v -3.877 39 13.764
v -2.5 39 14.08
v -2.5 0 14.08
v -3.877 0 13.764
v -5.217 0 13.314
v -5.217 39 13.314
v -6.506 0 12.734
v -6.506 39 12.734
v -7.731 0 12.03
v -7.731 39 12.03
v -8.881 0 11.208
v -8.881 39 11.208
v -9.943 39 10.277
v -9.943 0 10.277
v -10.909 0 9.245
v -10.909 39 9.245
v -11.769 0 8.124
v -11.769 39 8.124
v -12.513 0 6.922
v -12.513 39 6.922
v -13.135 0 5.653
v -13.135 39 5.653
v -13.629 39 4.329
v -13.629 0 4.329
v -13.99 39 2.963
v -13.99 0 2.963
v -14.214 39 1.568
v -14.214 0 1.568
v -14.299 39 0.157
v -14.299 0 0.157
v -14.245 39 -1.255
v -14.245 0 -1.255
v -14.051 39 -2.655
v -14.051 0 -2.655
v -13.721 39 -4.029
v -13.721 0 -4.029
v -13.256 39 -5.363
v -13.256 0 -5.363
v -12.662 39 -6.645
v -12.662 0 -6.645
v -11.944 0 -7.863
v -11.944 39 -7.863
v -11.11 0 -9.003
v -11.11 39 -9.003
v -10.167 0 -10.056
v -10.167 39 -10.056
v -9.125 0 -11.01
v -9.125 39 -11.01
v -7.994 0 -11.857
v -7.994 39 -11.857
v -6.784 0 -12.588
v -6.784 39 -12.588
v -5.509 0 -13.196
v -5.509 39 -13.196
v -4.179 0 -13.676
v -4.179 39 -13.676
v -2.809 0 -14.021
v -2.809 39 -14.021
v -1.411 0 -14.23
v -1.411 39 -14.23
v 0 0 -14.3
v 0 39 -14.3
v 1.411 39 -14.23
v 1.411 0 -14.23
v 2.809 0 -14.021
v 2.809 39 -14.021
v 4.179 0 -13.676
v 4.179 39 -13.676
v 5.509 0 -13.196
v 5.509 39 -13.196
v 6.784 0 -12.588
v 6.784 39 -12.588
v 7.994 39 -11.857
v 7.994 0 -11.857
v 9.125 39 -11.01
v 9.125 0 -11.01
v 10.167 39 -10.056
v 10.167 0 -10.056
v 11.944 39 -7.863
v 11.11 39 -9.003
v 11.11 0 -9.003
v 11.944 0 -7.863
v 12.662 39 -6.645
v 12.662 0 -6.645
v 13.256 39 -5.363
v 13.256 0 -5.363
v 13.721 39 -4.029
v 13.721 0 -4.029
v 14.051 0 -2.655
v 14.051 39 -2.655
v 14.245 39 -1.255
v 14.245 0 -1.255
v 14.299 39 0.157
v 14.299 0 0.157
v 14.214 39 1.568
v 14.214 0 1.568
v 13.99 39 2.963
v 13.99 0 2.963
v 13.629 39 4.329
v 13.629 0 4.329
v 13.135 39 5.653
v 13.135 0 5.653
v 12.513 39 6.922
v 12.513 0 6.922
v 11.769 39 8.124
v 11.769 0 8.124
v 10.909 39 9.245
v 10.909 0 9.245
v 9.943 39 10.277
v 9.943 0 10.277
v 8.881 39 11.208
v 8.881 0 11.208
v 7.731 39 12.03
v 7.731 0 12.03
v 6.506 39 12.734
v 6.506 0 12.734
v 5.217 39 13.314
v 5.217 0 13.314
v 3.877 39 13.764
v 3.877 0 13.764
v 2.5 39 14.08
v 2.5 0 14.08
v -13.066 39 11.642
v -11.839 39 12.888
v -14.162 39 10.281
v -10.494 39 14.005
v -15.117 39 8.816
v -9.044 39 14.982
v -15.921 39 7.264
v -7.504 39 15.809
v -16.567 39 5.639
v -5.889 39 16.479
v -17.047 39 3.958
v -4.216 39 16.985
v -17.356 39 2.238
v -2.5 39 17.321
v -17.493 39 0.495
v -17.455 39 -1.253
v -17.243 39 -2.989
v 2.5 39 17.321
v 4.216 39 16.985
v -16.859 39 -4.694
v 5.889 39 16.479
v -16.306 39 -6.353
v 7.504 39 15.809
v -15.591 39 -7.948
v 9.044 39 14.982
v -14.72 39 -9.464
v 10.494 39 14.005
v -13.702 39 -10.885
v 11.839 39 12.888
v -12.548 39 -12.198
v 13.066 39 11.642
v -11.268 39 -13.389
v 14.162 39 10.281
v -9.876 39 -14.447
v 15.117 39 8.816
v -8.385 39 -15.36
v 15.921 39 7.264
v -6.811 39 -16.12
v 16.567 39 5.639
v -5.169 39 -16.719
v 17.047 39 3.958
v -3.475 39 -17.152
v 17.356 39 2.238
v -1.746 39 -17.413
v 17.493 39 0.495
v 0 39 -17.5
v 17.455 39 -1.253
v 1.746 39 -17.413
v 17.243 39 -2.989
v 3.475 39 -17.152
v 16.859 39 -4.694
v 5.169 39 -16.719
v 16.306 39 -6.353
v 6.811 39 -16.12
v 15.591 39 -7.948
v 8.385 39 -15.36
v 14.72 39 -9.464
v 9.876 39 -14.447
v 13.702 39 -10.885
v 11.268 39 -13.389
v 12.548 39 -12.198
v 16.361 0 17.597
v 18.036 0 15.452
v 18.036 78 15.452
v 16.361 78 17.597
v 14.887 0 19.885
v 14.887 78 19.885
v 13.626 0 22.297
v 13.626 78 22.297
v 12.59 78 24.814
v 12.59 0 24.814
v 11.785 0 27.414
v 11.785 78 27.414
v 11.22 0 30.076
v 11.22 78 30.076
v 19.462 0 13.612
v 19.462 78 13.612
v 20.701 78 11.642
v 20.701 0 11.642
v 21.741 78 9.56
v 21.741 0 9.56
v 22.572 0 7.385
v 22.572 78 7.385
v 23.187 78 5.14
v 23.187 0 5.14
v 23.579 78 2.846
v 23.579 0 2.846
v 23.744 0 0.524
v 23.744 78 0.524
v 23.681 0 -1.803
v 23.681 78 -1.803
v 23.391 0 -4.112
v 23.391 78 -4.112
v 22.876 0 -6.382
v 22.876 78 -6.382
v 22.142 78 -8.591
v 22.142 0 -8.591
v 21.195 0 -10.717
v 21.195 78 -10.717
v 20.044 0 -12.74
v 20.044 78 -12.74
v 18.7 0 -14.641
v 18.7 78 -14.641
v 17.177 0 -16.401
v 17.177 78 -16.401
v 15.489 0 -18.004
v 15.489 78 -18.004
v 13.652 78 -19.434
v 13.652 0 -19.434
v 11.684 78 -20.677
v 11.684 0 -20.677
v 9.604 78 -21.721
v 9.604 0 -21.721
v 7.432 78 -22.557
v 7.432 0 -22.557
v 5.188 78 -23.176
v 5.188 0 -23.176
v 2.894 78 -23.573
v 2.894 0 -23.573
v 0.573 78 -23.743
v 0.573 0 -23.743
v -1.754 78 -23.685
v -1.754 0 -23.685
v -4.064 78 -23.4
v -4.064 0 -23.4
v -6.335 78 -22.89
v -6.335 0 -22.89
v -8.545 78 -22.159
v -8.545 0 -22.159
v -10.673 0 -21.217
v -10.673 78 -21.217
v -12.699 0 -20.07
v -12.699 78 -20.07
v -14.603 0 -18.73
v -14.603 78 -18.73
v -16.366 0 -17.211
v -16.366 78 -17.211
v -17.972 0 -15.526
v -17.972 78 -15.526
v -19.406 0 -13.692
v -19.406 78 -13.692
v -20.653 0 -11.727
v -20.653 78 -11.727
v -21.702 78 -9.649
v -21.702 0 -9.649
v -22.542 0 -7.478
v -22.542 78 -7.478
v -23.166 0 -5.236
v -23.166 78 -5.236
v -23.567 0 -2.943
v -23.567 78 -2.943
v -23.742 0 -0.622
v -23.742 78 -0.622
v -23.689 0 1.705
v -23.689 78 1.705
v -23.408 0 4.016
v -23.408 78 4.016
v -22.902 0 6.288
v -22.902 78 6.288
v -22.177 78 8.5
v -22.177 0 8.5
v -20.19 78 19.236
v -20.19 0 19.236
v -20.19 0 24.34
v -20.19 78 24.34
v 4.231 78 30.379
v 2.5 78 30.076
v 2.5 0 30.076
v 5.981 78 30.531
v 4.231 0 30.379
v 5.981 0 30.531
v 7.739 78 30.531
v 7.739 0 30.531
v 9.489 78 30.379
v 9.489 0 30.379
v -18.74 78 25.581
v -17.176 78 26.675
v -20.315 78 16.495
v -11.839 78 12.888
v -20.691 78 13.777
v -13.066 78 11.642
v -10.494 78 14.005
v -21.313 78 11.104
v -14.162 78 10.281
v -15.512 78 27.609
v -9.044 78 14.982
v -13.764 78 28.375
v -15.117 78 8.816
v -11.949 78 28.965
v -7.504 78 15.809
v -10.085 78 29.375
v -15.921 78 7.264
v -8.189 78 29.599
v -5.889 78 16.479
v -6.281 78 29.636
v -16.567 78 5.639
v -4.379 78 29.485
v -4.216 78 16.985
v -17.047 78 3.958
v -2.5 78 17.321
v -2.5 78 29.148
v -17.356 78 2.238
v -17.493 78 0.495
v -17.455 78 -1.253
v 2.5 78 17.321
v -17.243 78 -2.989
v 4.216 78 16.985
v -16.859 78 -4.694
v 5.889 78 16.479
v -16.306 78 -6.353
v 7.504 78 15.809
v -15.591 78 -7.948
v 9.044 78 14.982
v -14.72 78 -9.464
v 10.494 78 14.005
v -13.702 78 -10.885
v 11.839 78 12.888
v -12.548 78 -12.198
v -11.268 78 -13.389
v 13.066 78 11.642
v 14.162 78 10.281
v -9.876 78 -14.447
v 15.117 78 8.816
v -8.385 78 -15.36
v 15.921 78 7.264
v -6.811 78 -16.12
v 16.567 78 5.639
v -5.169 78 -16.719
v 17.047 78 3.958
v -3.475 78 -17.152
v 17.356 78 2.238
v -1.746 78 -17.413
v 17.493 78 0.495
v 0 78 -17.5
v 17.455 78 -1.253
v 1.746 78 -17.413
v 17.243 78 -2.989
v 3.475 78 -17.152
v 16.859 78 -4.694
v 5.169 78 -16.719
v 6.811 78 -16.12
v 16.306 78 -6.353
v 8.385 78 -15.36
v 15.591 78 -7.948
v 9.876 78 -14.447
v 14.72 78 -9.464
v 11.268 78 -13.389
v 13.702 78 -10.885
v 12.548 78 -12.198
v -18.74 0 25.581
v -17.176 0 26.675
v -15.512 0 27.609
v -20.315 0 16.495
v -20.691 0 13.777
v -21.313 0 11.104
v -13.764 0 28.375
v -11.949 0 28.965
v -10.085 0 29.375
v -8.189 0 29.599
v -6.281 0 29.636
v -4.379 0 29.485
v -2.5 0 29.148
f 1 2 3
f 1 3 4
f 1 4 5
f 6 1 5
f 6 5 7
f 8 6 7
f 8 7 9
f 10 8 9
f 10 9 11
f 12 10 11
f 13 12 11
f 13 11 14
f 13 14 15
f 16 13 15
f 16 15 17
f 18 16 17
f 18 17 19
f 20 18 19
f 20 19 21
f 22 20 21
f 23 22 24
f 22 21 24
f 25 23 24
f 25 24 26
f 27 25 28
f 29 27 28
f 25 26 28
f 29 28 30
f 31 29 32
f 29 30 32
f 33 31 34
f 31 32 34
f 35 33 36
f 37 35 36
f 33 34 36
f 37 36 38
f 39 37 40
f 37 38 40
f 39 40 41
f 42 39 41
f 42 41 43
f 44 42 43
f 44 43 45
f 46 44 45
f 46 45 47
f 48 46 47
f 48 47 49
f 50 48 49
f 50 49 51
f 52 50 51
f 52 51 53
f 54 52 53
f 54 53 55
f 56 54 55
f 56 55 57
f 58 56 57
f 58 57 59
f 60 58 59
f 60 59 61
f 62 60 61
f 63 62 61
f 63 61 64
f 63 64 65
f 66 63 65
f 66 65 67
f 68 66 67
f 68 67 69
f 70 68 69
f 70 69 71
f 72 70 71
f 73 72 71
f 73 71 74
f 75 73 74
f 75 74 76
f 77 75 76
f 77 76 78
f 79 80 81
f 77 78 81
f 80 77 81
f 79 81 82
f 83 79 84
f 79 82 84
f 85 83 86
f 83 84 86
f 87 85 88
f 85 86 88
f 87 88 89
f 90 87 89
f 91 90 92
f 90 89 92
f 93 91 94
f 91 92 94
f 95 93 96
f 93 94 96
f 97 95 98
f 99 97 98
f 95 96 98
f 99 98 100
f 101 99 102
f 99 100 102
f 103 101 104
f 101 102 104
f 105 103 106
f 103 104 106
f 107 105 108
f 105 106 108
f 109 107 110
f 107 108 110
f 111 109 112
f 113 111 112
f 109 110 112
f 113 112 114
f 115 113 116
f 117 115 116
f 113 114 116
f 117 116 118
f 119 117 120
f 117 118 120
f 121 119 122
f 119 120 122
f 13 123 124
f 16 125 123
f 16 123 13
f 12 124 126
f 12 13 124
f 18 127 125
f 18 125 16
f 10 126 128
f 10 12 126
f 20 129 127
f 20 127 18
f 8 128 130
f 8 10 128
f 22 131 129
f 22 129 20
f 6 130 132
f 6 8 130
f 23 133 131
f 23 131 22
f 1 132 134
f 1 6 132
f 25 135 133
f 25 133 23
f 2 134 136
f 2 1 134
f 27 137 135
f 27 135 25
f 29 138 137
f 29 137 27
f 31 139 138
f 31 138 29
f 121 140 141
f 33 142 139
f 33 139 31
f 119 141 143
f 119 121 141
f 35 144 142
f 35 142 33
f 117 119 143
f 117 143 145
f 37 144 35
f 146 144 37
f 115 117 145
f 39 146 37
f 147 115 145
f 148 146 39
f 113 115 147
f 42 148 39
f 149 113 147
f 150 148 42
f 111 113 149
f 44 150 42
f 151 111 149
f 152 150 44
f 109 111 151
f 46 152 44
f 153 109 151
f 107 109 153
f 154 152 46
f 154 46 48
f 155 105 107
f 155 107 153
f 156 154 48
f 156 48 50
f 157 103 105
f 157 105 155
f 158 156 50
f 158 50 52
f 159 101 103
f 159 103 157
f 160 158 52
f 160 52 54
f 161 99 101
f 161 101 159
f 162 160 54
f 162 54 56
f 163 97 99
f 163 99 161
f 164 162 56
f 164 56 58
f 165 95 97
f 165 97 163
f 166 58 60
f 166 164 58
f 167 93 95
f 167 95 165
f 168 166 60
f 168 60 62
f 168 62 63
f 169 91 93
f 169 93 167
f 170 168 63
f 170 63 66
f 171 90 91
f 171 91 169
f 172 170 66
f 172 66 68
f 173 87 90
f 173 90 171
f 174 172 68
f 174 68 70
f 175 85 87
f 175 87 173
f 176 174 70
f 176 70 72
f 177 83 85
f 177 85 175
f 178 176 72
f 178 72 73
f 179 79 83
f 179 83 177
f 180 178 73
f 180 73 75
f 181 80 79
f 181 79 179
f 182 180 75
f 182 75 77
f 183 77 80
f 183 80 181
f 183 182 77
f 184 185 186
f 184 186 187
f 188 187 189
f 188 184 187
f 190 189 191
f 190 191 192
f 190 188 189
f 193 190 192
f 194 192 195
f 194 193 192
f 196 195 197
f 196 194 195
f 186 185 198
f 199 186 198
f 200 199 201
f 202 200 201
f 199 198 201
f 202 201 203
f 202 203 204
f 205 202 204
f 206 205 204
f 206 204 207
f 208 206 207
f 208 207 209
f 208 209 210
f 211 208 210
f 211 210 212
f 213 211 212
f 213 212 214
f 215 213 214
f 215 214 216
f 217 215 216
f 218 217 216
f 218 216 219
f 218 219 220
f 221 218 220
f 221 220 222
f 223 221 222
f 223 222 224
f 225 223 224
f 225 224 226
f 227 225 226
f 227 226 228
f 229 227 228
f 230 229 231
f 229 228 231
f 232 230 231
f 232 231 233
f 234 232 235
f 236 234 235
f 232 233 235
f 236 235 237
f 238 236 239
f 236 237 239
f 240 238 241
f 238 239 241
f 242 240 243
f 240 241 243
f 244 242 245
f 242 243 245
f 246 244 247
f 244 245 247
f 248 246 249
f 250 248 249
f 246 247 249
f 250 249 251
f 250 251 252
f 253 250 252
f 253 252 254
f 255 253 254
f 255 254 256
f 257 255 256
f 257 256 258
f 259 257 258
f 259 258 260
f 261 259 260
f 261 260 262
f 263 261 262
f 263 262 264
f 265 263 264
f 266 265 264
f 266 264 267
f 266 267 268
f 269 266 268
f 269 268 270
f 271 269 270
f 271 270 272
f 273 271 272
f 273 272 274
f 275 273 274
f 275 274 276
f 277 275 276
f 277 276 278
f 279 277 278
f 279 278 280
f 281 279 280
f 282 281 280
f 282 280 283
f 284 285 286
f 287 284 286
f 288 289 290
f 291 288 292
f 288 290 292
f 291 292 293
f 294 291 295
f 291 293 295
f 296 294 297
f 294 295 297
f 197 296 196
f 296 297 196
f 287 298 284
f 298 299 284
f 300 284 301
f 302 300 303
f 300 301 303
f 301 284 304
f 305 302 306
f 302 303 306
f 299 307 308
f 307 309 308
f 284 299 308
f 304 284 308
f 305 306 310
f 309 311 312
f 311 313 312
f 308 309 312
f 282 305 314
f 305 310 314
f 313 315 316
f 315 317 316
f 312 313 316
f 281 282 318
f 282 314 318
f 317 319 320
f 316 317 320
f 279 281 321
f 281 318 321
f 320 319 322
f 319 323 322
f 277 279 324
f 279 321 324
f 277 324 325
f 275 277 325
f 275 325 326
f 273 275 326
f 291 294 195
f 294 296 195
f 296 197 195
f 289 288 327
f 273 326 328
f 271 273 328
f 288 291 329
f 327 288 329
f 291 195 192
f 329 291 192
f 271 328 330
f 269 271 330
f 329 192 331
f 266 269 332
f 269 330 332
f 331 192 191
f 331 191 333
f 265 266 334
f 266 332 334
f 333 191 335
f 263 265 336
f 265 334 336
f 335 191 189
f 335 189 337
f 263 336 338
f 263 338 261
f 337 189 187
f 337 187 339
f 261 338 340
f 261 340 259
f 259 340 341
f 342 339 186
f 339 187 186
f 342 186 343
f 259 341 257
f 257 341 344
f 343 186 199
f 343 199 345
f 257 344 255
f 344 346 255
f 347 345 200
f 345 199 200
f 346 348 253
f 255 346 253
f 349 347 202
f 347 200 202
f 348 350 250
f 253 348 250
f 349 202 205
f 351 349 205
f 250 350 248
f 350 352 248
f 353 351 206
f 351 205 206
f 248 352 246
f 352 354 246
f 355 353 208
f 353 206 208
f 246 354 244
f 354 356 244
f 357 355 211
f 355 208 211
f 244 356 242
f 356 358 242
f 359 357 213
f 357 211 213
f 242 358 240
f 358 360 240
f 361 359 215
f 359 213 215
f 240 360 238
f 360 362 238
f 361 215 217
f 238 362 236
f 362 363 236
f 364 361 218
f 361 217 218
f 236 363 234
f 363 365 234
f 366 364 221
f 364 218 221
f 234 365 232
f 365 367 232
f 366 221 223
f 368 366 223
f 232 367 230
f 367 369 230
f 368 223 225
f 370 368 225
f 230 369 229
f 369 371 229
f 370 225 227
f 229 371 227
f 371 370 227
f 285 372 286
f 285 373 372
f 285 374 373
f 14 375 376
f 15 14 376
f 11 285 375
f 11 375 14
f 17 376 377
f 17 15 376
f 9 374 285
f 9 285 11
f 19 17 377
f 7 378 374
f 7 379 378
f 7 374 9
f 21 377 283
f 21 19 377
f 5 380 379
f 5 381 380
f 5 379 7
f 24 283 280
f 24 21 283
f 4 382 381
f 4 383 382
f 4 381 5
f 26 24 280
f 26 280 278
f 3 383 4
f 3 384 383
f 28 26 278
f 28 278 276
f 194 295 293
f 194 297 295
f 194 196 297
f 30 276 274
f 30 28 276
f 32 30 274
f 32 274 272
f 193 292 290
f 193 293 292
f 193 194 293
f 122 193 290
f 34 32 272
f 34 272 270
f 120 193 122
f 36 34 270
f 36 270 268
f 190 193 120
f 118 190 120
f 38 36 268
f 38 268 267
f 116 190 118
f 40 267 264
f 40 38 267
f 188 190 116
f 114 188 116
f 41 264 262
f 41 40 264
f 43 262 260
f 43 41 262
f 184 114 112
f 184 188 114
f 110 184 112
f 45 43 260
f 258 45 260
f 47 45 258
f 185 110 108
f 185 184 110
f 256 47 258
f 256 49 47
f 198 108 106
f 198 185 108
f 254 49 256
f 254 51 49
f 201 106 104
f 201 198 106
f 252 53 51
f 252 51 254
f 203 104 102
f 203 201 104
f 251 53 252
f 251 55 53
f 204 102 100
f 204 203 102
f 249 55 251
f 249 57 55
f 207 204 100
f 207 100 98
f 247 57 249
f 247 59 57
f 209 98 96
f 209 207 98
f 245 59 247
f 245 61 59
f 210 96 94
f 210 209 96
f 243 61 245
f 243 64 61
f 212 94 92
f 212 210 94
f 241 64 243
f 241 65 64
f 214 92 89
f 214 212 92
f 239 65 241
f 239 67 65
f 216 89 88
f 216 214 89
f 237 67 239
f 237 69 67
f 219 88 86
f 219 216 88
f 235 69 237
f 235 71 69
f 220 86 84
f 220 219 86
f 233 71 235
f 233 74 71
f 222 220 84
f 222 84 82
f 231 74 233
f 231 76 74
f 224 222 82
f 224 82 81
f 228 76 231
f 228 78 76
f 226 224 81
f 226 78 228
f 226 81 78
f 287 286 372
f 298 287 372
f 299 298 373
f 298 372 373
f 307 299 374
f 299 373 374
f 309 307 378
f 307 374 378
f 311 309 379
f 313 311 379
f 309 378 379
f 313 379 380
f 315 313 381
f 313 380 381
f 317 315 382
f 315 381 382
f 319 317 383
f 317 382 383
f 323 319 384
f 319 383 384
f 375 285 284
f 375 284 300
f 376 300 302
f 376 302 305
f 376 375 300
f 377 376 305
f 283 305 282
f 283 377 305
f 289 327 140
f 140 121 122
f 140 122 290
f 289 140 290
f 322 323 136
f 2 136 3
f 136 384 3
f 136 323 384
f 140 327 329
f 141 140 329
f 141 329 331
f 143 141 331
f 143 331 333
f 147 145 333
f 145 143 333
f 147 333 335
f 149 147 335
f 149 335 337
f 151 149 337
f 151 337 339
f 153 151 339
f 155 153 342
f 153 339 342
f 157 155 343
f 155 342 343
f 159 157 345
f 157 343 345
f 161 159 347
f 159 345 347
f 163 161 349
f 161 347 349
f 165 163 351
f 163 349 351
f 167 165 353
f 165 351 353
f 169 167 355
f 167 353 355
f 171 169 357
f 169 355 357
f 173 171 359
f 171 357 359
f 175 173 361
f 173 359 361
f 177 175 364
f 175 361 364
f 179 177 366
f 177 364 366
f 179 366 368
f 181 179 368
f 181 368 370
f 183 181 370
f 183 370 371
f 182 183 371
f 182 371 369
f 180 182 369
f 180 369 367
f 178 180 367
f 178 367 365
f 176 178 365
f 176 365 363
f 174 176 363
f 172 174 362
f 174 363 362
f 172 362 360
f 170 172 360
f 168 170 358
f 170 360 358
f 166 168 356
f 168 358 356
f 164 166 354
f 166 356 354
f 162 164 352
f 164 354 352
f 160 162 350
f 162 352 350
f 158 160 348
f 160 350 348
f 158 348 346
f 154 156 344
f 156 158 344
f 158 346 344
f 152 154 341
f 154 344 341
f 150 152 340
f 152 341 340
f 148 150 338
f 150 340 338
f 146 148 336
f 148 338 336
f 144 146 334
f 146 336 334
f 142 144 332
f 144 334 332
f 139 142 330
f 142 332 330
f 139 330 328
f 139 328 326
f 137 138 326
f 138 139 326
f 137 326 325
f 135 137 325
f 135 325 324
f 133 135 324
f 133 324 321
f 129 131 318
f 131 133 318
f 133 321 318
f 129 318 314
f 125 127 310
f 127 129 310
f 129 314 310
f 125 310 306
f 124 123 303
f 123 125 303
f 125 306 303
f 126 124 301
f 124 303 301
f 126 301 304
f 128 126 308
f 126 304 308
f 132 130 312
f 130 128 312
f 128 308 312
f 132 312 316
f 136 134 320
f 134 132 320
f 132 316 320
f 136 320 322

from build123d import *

# Parameters (mm, degrees)
BOSS_EXTRUDE1_DEPTH = 78
SKETCH2_R           = 17.5
CUT_EXTRUDE1_DEPTH  = 39
FILLET1_R           = 30


with BuildPart() as part:
    # Sketch1 → Boss-Extrude1 (new body)
    with BuildSketch(Plane(origin=(0, 0, 0), x_dir=(1, 0, 0), z_dir=(0, 1, 0))):
        with BuildLine():
            Line((2.5, -14.079772725), (2.5, -21.006468516))
            Line((2.5, -21.006468516), (2.5, -30.076468516))
            ThreePointArc((2.5, -30.076468516), (6.86, -30.550052571), (11.22, -30.076468516))
            Line((11.22, -30.076468516), (11.22, -20.932608533))
            ThreePointArc((11.22, -20.932608533), (6.153268827, 22.93904494), (-20.19, -12.50705401))
            Line((-20.19, -12.50705401), (-20.19, -24.339979577))
            ThreePointArc((-20.19, -24.339979577), (-11.948714524, -28.965226171), (-2.5, -29.148218549))
            Line((-2.5, -29.148218549), (-2.5, -21.006468516))
            Line((-2.5, -21.006468516), (-2.5, -14.079772725))
            ThreePointArc((-2.5, -14.079772725), (0, 14.3), (2.5, -14.079772725))
        make_face()
    extrude(amount=BOSS_EXTRUDE1_DEPTH)

    # Sketch2 → Cut-Extrude1 (cut)
    with BuildSketch(Plane(origin=(0, 78, 0), x_dir=(1, 0, 0), z_dir=(0, 1, 0))):
        Circle(SKETCH2_R)
    extrude(amount=-CUT_EXTRUDE1_DEPTH, mode=Mode.SUBTRACT)

    # Fillet1
    # the kernel refuses this fillet: 30 mm, written as the material it adds along each edge
    with BuildSketch(Plane(origin=(11.22, 0, 20.932608533), x_dir=(0.7793190463800559, 0, -0.626627340569561), z_dir=(0, 1, 0))) as fillet1_piece_1:
        with BuildLine():
            CenterArc((14.269740905, -29.487081198), FILLET1_R, 100.610162443, 31.198957304)
            Line((-5.729792663, -7.125984242), (-6.129783335, -6.678762303))
            ThreePointArc((-6.129783335, -6.678762303), (-3.33248776, -3.187015717), (-0.467591428, 0.375976404))
            Line((-0.467591428, 0.375976404), (0.110475413, 0.589741624))
            ThreePointArc((0.110475413, 0.589741624), (4.372985116, 0.193939281), (8.635494818, 0.589741624))
            Line((8.635494818, 0.589741624), (8.745970232, 0))
        make_face()
    extrude(amount=78)
    with BuildSketch(Plane(origin=(-20.19, 0, 12.50705401), x_dir=(0, 0, 1), z_dir=(0, 1, 0))) as fillet1_piece_2:
        with BuildLine():
            CenterArc((6.729016275, -30), FILLET1_R, 90, 20.970079677)
            Line((-4.007395047, -1.986976744), (-4.222123273, -1.426716279))
            ThreePointArc((-4.222123273, -1.426716279), (-2.22334858, -0.55048945), (-0.31596768, 0.510063158))
            Line((-0.31596768, 0.510063158), (0, 0.6))
            Line((0, 0.6), (6.729016275, 0.6))
            Line((6.729016275, 0.6), (6.729016275, 0))
        make_face()
    extrude(amount=78)


solid = part.part
